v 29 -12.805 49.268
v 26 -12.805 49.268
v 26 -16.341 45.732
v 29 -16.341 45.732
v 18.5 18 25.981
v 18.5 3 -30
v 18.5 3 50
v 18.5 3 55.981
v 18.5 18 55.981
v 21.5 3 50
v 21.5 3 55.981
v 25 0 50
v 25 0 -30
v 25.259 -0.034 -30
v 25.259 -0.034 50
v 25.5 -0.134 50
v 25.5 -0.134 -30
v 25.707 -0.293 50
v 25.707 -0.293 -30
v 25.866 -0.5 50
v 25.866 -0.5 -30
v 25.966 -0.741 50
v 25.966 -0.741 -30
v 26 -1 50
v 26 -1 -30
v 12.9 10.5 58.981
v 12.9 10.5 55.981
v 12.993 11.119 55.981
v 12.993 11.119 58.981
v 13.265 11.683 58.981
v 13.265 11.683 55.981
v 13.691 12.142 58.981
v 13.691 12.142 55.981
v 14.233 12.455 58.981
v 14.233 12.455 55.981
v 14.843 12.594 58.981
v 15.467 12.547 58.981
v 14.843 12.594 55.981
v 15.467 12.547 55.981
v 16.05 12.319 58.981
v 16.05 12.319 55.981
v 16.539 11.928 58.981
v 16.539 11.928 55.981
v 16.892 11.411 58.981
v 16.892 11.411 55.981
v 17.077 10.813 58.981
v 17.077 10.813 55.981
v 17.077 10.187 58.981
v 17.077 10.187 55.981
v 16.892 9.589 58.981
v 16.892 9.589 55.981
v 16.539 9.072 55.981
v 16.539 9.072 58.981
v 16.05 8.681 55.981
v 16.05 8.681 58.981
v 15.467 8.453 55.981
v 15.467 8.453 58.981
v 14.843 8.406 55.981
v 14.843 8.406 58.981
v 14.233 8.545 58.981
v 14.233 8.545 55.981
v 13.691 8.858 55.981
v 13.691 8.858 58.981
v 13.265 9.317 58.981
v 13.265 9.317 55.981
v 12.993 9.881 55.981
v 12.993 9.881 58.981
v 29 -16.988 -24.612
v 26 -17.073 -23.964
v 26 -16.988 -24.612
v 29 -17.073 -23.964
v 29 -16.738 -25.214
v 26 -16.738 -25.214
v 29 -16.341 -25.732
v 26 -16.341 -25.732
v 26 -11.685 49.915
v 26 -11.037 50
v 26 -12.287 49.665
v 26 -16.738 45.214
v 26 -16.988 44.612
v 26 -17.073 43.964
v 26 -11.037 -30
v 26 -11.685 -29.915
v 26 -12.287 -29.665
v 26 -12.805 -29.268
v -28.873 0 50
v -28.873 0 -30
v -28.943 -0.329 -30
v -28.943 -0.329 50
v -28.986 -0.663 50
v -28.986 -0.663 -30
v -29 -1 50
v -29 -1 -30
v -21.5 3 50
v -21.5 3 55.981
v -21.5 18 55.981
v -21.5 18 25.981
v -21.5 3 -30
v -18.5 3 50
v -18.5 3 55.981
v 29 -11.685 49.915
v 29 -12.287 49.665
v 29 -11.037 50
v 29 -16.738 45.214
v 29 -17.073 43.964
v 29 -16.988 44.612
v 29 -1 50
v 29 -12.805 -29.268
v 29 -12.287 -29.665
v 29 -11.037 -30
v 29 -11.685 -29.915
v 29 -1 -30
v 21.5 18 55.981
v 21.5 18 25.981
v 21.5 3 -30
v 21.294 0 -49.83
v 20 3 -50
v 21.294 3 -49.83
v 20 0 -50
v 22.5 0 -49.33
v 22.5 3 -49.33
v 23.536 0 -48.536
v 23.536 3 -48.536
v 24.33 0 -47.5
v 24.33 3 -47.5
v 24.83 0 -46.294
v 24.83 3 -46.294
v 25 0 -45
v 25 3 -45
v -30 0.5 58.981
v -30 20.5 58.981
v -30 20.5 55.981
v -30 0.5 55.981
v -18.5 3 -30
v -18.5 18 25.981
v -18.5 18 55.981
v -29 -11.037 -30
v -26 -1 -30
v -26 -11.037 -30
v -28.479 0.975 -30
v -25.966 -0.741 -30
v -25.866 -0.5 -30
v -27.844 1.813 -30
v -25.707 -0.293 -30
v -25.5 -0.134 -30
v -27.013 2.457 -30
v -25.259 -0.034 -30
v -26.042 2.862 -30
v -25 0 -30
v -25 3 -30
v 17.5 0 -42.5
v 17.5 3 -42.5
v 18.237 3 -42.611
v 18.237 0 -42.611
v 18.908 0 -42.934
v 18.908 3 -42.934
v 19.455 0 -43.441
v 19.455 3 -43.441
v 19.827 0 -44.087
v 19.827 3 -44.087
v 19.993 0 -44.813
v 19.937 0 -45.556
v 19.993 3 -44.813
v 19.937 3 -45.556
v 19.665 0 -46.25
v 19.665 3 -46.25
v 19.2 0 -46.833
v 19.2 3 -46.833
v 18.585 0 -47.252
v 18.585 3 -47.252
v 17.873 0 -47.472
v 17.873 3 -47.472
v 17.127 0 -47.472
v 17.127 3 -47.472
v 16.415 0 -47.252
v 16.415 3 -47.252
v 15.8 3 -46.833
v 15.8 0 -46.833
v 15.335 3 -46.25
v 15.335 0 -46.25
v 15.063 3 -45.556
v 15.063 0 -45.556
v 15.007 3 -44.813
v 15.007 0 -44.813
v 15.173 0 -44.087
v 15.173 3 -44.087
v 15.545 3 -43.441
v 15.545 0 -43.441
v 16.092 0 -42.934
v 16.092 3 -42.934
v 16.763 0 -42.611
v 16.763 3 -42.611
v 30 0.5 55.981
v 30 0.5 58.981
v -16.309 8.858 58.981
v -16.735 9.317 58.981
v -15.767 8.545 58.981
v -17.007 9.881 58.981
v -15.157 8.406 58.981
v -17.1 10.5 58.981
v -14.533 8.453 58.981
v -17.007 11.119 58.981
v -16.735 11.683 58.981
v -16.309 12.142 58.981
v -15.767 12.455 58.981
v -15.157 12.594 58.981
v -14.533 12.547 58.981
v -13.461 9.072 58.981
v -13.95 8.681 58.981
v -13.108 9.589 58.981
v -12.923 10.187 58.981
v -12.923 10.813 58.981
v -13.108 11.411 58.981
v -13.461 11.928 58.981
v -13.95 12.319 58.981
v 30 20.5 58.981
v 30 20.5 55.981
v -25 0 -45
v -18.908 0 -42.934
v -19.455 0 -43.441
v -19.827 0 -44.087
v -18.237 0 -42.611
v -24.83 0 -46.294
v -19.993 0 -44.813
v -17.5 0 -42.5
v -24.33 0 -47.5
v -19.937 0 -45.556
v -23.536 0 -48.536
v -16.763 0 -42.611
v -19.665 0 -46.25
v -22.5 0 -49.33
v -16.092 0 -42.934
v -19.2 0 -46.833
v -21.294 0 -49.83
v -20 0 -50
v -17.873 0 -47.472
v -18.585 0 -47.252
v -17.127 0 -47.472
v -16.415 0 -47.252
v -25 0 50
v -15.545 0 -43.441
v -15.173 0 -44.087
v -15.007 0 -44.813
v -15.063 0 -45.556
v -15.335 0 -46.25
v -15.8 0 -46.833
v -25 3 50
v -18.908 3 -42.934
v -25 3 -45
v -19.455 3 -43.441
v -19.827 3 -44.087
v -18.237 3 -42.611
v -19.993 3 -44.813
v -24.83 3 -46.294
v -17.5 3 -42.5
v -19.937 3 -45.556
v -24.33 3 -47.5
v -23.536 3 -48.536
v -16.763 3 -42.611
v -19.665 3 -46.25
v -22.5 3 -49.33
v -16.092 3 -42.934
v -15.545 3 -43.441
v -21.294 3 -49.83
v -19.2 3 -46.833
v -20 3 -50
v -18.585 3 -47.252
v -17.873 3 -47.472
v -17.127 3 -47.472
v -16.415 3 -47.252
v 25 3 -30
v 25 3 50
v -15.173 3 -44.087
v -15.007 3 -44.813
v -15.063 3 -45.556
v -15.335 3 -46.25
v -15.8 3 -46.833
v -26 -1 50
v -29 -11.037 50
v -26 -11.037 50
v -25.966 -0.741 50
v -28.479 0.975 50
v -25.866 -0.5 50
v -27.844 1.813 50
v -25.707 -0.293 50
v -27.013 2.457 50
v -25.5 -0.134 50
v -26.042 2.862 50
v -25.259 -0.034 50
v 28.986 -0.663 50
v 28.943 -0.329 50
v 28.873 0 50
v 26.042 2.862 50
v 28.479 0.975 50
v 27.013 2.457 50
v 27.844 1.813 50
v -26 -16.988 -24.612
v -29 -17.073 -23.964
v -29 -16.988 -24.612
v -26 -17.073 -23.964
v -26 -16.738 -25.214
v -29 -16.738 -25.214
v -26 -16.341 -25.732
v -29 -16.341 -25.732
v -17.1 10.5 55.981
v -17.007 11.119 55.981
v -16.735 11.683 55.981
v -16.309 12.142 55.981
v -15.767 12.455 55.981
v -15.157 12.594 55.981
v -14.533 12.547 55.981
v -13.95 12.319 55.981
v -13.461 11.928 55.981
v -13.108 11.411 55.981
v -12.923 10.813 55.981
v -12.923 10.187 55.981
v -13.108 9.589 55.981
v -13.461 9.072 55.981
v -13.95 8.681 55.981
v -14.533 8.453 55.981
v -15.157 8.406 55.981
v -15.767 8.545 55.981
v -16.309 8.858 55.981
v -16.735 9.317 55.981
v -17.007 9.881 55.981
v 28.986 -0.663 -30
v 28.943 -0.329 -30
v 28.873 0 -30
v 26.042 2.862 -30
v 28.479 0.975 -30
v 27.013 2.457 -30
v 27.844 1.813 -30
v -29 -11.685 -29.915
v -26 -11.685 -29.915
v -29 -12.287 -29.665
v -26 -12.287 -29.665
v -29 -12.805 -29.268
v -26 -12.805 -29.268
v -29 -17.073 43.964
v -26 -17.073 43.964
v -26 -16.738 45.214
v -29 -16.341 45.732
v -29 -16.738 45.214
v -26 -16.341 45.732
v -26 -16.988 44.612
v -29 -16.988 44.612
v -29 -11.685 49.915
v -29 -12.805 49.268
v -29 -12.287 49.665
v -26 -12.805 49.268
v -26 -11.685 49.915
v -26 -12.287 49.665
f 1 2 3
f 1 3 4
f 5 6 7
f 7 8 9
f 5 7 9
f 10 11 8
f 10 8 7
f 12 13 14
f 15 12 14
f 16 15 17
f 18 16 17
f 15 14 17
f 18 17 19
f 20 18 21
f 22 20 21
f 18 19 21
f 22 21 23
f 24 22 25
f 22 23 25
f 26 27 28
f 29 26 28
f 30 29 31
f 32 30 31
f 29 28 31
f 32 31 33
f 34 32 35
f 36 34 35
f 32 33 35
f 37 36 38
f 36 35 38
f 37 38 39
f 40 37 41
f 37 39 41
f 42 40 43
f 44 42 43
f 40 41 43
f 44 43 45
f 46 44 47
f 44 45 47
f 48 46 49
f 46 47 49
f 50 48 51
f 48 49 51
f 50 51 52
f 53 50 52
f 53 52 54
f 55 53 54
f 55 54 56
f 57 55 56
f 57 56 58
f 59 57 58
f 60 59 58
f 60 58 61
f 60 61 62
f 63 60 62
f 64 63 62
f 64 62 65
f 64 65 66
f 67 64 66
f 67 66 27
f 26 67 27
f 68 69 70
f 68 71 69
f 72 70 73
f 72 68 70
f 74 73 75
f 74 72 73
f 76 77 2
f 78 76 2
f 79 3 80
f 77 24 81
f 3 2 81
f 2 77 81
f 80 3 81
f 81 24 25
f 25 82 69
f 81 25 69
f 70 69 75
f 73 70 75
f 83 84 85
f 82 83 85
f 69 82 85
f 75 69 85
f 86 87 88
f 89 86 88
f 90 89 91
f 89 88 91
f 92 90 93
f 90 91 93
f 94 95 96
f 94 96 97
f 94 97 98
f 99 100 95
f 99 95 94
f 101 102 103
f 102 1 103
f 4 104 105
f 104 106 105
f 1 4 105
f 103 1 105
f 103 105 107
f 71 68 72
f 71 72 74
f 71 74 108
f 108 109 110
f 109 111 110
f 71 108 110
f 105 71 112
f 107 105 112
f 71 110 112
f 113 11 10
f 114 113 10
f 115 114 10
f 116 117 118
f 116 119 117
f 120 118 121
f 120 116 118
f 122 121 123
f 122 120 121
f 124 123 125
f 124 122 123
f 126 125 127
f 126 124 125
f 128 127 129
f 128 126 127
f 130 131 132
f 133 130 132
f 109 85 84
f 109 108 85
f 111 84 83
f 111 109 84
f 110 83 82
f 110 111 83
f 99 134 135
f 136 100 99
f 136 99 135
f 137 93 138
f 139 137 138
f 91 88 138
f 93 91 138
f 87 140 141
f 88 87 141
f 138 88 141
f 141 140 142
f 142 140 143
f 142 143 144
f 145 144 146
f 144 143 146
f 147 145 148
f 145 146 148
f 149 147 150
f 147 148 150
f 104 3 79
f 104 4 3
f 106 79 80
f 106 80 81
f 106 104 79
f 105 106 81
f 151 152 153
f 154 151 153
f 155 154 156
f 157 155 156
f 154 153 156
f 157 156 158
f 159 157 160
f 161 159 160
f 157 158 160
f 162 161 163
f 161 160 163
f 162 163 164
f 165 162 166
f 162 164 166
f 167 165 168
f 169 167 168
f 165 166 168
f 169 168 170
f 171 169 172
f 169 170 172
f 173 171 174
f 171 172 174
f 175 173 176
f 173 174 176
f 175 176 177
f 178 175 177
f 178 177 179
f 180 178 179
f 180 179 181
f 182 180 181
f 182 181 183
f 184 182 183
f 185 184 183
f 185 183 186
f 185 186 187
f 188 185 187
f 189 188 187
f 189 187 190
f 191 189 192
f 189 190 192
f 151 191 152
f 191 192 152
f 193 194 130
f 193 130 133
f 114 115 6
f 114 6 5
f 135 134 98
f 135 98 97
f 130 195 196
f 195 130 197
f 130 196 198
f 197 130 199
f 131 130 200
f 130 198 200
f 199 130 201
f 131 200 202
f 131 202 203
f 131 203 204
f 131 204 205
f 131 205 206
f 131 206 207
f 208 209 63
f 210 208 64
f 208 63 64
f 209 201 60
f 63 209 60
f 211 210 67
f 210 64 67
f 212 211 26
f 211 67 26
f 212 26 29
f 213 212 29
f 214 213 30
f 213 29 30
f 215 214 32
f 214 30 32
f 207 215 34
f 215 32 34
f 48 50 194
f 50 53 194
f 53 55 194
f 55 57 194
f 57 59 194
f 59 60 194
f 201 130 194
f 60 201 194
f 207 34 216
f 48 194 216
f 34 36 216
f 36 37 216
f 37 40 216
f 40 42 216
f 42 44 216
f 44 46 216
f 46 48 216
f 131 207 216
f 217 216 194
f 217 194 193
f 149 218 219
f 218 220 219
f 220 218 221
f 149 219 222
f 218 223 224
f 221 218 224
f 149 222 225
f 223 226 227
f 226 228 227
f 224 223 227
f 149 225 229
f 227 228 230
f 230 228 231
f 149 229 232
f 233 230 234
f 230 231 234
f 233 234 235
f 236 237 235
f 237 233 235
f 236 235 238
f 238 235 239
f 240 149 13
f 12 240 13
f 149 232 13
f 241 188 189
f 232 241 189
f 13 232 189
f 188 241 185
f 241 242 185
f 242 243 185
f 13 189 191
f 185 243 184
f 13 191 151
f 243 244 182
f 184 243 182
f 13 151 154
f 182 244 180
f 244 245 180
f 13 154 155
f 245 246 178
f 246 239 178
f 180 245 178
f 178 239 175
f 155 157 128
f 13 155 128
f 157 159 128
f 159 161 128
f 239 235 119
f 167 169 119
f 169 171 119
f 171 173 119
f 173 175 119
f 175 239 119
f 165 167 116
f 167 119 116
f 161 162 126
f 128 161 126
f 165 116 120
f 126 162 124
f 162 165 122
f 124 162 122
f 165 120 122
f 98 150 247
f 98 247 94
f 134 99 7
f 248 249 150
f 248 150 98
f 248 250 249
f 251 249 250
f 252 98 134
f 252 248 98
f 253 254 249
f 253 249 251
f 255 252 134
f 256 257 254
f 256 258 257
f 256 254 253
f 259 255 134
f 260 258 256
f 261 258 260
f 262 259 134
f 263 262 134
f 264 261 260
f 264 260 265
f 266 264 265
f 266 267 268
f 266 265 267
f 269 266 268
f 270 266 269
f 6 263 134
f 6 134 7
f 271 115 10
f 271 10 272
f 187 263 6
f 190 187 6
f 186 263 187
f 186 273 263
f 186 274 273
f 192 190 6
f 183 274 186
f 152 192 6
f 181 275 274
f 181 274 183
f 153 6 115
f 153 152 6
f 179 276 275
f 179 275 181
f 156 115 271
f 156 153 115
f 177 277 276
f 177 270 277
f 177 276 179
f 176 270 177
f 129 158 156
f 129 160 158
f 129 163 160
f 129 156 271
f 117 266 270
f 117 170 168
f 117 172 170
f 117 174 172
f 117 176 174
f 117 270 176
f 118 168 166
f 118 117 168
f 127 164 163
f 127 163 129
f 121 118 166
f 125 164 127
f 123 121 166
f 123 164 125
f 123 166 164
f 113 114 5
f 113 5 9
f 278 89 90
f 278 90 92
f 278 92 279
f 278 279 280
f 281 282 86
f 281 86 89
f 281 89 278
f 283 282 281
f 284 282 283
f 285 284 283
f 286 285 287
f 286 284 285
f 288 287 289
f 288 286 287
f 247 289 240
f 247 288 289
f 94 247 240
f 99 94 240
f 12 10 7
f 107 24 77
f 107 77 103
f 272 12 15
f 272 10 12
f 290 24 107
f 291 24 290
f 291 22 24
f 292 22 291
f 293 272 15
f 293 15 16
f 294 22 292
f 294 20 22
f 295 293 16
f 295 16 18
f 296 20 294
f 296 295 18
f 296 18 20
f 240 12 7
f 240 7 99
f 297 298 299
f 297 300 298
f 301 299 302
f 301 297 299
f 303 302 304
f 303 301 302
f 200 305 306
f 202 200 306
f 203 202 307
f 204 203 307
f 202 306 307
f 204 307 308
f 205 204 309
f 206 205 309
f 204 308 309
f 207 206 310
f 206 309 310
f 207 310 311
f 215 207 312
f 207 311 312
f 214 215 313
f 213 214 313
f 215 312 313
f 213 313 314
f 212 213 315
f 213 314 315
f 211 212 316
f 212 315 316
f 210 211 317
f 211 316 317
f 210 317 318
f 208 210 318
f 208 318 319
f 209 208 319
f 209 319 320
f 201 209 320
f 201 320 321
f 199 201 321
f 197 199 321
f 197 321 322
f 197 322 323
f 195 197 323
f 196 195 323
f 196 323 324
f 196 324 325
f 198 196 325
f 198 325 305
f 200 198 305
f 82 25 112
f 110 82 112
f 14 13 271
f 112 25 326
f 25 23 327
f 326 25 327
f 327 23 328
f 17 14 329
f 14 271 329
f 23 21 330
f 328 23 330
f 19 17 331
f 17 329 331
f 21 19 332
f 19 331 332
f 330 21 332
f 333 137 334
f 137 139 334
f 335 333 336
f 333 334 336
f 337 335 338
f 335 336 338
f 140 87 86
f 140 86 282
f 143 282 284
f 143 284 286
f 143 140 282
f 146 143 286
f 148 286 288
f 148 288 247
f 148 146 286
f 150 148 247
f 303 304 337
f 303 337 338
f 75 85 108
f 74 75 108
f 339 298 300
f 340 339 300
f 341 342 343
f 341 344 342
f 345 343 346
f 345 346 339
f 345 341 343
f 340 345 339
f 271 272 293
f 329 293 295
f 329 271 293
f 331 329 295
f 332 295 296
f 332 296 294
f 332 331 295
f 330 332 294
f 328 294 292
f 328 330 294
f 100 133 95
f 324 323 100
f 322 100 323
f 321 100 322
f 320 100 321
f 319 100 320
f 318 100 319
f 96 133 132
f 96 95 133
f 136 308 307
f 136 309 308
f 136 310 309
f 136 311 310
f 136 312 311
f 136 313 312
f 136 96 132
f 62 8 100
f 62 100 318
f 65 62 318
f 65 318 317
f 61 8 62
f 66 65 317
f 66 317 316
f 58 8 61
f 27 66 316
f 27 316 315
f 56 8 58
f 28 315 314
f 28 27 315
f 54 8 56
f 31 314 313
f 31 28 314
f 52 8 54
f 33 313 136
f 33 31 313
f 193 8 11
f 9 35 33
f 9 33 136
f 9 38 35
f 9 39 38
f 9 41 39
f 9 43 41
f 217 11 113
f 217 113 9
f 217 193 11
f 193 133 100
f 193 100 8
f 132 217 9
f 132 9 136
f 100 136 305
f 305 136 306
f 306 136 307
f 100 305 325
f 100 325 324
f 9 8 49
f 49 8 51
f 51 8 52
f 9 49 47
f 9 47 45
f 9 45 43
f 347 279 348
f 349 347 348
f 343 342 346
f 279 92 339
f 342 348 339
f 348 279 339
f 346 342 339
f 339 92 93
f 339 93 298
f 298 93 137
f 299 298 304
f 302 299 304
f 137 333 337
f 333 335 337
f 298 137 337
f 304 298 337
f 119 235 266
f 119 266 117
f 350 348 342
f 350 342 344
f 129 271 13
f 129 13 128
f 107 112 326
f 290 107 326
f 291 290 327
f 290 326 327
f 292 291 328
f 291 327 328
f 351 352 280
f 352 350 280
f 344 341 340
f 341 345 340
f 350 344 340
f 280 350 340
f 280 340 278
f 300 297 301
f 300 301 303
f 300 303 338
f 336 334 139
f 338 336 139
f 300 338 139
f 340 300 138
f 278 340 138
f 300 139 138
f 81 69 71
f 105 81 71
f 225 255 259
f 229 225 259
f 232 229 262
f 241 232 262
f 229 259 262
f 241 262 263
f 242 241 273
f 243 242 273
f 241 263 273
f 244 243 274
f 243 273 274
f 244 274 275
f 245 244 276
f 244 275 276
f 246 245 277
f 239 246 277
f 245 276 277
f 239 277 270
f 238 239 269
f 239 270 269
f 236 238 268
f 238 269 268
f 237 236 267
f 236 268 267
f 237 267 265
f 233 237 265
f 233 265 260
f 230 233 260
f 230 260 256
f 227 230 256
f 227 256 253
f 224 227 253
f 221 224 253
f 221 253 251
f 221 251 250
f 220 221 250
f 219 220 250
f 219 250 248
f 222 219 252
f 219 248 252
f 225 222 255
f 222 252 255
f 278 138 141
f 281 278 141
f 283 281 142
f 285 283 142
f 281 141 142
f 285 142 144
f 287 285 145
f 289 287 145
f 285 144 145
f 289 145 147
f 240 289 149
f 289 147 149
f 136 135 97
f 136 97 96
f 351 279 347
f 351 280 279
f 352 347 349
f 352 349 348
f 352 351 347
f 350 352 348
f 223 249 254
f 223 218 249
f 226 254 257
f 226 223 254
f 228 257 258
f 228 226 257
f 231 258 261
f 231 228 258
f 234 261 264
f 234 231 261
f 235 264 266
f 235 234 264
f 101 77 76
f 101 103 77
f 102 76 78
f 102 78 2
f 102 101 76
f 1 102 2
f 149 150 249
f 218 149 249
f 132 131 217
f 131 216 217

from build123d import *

# Parameters (mm, degrees)
ESBO_O1_W                 = 90
ESBO_O1_H                 = 100
RESSALTO_EXTRUS_O1_DEPTH  = 3
ESBO_O4_W                 = 20
ESBO_O4_H                 = 20
CORTE_EXTRUS_O1_DEPTH     = 3
DOBRA_START               = -30
DOBRA_ESBO_ADA1_DEPTH     = 80
DOBRA_ESBO_ADA1_2_DEPTH   = 80
DOBRA_ESBO_ADA2_DEPTH     = 80
DOBRA_ESBO_ADA2_2_DEPTH   = 80
FILETE1_R                 = 5
CHANFRO1_SIZE             = 5
FILETE2_R                 = 2.5
ESBO_O7_R                 = 2.5
CORTE_EXTRUS_O2_DEPTH     = 3
RESSALTO_EXTRUS_O2_DEPTH  = 21.5
ESBO_O9_W                 = 37
ESBO_O9_H                 = 15
CORTE_EXTRUS_O7_DEPTH     = 90
ESBO_O10_W                = 3
ESBO_O10_H                = 20
RESSALTO_EXTRUS_O3_DEPTH  = 30
FURO_ROSCADO_DE_M51_D     = 4.2
FURO_ROSCADO_DE_M51_DEPTH = 14
FURO_ROSCADO_DE_M51_TIP   = 1.2618073


# Read off the part's stored shape, not the designer's step: Dobra esboçada1, Dobra esboçada2
with BuildPart() as part:
    # Esboço1 → Ressalto-extrusão1 (new body)
    with BuildSketch(Plane(origin=(0, 0, 0), x_dir=(1, 0, 0), z_dir=(0, 1, 0))):
        Rectangle(ESBO_O1_W, ESBO_O1_H)
    extrude(amount=RESSALTO_EXTRUS_O1_DEPTH)

    # Esboço4 → Corte-extrusão1 (cut)
    with BuildSketch(Plane(origin=(0, 3, 0), x_dir=(1, 0, 0), z_dir=(0, 1, 0))):
        with Locations((-35, 40)):
            Rectangle(ESBO_O4_W, ESBO_O4_H)
        with Locations((35, 40)):
            Rectangle(ESBO_O4_W, ESBO_O4_H)
    extrude(amount=-CORTE_EXTRUS_O1_DEPTH, mode=Mode.SUBTRACT)

    # Dobra esboçada1 outline → Dobra esboçada1 (cut)
    with BuildSketch(Plane.XY.offset(DOBRA_START)):
        with BuildLine():
            Line((-45, 0), (-28.872983346, 0))
            ThreePointArc((-28.872983346, 0), (-27.449489743, 2.16227766), (-25, 3))
            Line((-25, 3), (-45, 3))
            Line((-45, 3), (-45, 0))
        make_face()
    extrude(amount=DOBRA_ESBO_ADA1_DEPTH, mode=Mode.SUBTRACT)

    # Dobra esbo_ada1 2 outline → Dobra esbo_ada1 2 (add)
    with BuildSketch(Plane.XY.offset(DOBRA_START)):
        with BuildLine():
            ThreePointArc((-28.872983346, 0), (-28.968118785, -0.49598283), (-29, -1))
            Line((-29, -1), (-29, -17.073009183))
            Line((-29, -17.073009183), (-26, -17.073009183))
            Line((-26, -17.073009183), (-26, -1))
            ThreePointArc((-26, -1), (-25.707106781, -0.292893219), (-25, 0))
            Line((-25, 0), (-28.872983346, 0))
        make_face()
    extrude(amount=DOBRA_ESBO_ADA1_2_DEPTH)

    # Dobra esboçada2 outline → Dobra esboçada2 (cut)
    with BuildSketch(Plane.XY.offset(DOBRA_START)):
        with BuildLine():
            ThreePointArc((25, 3), (27.449489743, 2.16227766), (28.872983346, 0))
            Line((28.872983346, 0), (45, 0))
            Line((45, 0), (45, 3))
            Line((45, 3), (25, 3))
        make_face()
    extrude(amount=DOBRA_ESBO_ADA2_DEPTH, mode=Mode.SUBTRACT)

    # Dobra esbo_ada2 2 outline → Dobra esbo_ada2 2 (add)
    with BuildSketch(Plane.XY.offset(DOBRA_START)):
        with BuildLine():
            Line((26, -1), (26, -17.073009183))
            Line((26, -17.073009183), (29, -17.073009183))
            Line((29, -17.073009183), (29, -1))
            ThreePointArc((29, -1), (28.968118785, -0.49598283), (28.872983346, 0))
            Line((28.872983346, 0), (25, 0))
            ThreePointArc((25, 0), (25.707106781, -0.292893219), (26, -1))
        make_face()
    extrude(amount=DOBRA_ESBO_ADA2_2_DEPTH)

    # Filete1
    filete1_edges = [part.edges().sort_by_distance(p)[0] for p in [
        (-25, 1.5, -50),
        (25, 1.5, -50),
    ]]
    fillet(filete1_edges, radius=FILETE1_R)

    # Chanfro1
    chanfro1_edges = [part.edges().sort_by_distance(p)[0] for p in [
        (27.5, -17.073009183, -30),
        (27.5, -17.073009183, 50),
        (-27.5, -17.073009183, -30),
        (-27.5, -17.073009183, 50),
    ]]
    chamfer(chanfro1_edges, length=CHANFRO1_SIZE)

    # Filete2
    filete2_edges = [part.edges().sort_by_distance(p)[0] for p in [
        (27.5, -12.073009183, 50),
        (27.5, -17.073009183, -25),
        (27.5, -17.073009183, 45),
        (-27.5, -17.073009183, -25),
        (-27.5, -17.073009183, 45),
        (-27.5, -12.073009183, 50),
        (27.5, -12.073009183, -30),
        (-27.5, -12.073009183, -30),
    ]]
    fillet(filete2_edges, radius=FILETE2_R)

    # Esboço7 → Corte-extrusão2 (cut)
    with BuildSketch(Plane(origin=(0, 3, 0), x_dir=(1, 0, 0), z_dir=(0, 1, 0))):
        with Locations(Location((-17.5, 45, 0), (0, 0, 270))):
            Circle(ESBO_O7_R)
        with Locations(Location((17.5, 45, 0), (0, 0, 270))):
            Circle(ESBO_O7_R)
    extrude(amount=-CORTE_EXTRUS_O2_DEPTH, mode=Mode.SUBTRACT)

    # Esboço8 → Ressalto-extrusão2 (add, symmetric)
    with BuildSketch(Plane(origin=(0, 0, 0), x_dir=(0, 0, -1), z_dir=(1, 0, 0))):
        Polygon((30, 3), (-25.980762114, 18), (-55.980762114, 18), (-55.980762114, 3), align=None)
    extrude(amount=RESSALTO_EXTRUS_O2_DEPTH, both=True)

    # Esboço9 → Corte-extrusão7 (cut)
    with BuildSketch(Plane.XY.offset(55.980762114)):
        with Locations((0, 10.5)):
            Rectangle(ESBO_O9_W, ESBO_O9_H)
    extrude(amount=-CORTE_EXTRUS_O7_DEPTH, mode=Mode.SUBTRACT)

    # Esboço10 → Ressalto-extrusão3 (add, symmetric)
    with BuildSketch(Plane(origin=(0, 0, 0), x_dir=(0, 0, -1), z_dir=(1, 0, 0))):
        with Locations((-57.480762114, 10.5)):
            Rectangle(ESBO_O10_W, ESBO_O10_H)
    extrude(amount=RESSALTO_EXTRUS_O3_DEPTH, both=True)

    # Furo roscado de M51
    with Locations(Plane.XY.offset(58.980762114)):
        with Locations((-15, 10.5), (15, 10.5)):
            Hole(FURO_ROSCADO_DE_M51_D / 2, depth=FURO_ROSCADO_DE_M51_DEPTH)
            with Locations((0, 0, -(FURO_ROSCADO_DE_M51_DEPTH + FURO_ROSCADO_DE_M51_TIP / 2))):  # 118° drill point
                Cone(0, FURO_ROSCADO_DE_M51_D / 2, FURO_ROSCADO_DE_M51_TIP, mode=Mode.SUBTRACT)


solid = part.part
